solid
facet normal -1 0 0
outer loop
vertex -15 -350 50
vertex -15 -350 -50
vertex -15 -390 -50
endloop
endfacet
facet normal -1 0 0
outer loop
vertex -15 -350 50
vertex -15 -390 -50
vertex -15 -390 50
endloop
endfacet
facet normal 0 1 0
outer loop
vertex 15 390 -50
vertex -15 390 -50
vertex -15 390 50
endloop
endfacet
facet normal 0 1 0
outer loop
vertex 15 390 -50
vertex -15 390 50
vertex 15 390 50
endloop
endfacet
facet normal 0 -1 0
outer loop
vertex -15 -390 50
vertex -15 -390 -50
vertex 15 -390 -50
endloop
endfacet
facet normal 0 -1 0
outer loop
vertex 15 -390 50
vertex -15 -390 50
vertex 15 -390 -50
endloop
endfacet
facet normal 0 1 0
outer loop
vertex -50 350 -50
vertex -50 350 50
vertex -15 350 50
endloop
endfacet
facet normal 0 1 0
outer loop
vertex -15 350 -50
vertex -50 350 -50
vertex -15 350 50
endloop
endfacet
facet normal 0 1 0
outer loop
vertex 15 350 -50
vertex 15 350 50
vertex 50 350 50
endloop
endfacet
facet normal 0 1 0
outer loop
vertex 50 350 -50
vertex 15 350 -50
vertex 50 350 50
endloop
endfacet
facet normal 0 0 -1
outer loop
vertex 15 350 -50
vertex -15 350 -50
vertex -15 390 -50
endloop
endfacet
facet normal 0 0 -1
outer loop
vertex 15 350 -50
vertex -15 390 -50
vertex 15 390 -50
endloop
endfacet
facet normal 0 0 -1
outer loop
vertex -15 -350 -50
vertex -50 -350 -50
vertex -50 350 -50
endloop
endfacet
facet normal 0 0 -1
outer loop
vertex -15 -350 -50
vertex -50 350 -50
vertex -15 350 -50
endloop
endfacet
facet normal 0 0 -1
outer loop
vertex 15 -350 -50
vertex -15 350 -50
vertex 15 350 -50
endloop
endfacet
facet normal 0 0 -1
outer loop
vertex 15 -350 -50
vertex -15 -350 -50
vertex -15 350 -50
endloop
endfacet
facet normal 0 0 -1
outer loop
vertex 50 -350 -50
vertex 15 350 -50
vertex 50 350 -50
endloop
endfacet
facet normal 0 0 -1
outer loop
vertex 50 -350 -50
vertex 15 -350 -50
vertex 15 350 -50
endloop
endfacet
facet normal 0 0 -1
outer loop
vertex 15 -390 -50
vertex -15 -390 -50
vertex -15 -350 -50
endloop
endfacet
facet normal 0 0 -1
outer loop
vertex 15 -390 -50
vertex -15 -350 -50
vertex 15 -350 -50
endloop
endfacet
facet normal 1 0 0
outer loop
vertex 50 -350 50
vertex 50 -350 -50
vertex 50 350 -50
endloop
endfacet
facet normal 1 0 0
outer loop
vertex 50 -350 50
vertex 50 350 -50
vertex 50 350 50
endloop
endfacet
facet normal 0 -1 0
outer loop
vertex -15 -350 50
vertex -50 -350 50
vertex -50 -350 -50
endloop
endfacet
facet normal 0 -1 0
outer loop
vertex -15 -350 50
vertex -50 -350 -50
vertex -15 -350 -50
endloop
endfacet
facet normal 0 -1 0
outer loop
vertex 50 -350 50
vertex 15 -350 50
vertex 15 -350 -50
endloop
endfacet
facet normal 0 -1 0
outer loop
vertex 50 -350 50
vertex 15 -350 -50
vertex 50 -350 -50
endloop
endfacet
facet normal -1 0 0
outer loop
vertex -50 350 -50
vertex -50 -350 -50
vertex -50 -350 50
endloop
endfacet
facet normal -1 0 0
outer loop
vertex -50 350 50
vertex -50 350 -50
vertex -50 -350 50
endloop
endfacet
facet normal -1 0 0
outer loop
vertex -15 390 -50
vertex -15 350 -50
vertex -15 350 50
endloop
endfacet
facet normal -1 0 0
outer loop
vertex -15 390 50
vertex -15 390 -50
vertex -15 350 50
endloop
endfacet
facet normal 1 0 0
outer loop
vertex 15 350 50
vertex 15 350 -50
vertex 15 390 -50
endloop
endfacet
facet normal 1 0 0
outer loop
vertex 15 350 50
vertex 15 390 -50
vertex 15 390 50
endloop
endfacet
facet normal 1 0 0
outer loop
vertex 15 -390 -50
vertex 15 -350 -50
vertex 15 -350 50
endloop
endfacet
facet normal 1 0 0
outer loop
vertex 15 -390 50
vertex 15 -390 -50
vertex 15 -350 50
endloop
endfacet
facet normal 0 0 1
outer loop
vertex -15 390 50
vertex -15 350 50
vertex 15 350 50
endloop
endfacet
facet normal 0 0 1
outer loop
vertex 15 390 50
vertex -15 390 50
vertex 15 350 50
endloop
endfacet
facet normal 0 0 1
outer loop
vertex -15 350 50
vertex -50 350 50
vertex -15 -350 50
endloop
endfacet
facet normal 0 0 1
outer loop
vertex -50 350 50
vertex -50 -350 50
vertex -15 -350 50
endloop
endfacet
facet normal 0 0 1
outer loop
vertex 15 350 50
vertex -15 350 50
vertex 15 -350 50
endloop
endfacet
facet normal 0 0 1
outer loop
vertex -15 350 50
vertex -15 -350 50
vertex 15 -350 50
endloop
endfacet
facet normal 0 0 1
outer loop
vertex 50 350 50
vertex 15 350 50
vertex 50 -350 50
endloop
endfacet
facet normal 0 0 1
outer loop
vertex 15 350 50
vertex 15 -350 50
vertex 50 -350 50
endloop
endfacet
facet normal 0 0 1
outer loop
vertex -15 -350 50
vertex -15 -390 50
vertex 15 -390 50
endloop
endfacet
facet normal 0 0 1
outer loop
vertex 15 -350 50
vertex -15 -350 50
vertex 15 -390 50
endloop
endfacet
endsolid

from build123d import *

# Parameters (mm, degrees)
F2_W     = 100
F2_H     = 100
F3_DEPTH = 350
F4_W     = 30
F4_H     = 100
F5_DEPTH = 40


# Not quite as in the source:
# - a pattern or mirror of a feature is missing from the dataset's text; its kind, count and spacing are read off the source's solid


with BuildPart() as f3:
    # F2 (on Front) → F3 (new body, symmetric)
    with BuildSketch(Plane.XZ):
        Rectangle(F2_W, F2_H)
    extrude(amount=F3_DEPTH, both=True)

    # F4 (on face) → F5 (join)
    with BuildSketch(Plane.XZ.offset(350)):
        Rectangle(F4_W, F4_H)
    f5 = extrude(amount=F5_DEPTH)

    # F5_copies: F5 across plane
    add(f5.mirror(Plane.ZX))


solid = f3.part
